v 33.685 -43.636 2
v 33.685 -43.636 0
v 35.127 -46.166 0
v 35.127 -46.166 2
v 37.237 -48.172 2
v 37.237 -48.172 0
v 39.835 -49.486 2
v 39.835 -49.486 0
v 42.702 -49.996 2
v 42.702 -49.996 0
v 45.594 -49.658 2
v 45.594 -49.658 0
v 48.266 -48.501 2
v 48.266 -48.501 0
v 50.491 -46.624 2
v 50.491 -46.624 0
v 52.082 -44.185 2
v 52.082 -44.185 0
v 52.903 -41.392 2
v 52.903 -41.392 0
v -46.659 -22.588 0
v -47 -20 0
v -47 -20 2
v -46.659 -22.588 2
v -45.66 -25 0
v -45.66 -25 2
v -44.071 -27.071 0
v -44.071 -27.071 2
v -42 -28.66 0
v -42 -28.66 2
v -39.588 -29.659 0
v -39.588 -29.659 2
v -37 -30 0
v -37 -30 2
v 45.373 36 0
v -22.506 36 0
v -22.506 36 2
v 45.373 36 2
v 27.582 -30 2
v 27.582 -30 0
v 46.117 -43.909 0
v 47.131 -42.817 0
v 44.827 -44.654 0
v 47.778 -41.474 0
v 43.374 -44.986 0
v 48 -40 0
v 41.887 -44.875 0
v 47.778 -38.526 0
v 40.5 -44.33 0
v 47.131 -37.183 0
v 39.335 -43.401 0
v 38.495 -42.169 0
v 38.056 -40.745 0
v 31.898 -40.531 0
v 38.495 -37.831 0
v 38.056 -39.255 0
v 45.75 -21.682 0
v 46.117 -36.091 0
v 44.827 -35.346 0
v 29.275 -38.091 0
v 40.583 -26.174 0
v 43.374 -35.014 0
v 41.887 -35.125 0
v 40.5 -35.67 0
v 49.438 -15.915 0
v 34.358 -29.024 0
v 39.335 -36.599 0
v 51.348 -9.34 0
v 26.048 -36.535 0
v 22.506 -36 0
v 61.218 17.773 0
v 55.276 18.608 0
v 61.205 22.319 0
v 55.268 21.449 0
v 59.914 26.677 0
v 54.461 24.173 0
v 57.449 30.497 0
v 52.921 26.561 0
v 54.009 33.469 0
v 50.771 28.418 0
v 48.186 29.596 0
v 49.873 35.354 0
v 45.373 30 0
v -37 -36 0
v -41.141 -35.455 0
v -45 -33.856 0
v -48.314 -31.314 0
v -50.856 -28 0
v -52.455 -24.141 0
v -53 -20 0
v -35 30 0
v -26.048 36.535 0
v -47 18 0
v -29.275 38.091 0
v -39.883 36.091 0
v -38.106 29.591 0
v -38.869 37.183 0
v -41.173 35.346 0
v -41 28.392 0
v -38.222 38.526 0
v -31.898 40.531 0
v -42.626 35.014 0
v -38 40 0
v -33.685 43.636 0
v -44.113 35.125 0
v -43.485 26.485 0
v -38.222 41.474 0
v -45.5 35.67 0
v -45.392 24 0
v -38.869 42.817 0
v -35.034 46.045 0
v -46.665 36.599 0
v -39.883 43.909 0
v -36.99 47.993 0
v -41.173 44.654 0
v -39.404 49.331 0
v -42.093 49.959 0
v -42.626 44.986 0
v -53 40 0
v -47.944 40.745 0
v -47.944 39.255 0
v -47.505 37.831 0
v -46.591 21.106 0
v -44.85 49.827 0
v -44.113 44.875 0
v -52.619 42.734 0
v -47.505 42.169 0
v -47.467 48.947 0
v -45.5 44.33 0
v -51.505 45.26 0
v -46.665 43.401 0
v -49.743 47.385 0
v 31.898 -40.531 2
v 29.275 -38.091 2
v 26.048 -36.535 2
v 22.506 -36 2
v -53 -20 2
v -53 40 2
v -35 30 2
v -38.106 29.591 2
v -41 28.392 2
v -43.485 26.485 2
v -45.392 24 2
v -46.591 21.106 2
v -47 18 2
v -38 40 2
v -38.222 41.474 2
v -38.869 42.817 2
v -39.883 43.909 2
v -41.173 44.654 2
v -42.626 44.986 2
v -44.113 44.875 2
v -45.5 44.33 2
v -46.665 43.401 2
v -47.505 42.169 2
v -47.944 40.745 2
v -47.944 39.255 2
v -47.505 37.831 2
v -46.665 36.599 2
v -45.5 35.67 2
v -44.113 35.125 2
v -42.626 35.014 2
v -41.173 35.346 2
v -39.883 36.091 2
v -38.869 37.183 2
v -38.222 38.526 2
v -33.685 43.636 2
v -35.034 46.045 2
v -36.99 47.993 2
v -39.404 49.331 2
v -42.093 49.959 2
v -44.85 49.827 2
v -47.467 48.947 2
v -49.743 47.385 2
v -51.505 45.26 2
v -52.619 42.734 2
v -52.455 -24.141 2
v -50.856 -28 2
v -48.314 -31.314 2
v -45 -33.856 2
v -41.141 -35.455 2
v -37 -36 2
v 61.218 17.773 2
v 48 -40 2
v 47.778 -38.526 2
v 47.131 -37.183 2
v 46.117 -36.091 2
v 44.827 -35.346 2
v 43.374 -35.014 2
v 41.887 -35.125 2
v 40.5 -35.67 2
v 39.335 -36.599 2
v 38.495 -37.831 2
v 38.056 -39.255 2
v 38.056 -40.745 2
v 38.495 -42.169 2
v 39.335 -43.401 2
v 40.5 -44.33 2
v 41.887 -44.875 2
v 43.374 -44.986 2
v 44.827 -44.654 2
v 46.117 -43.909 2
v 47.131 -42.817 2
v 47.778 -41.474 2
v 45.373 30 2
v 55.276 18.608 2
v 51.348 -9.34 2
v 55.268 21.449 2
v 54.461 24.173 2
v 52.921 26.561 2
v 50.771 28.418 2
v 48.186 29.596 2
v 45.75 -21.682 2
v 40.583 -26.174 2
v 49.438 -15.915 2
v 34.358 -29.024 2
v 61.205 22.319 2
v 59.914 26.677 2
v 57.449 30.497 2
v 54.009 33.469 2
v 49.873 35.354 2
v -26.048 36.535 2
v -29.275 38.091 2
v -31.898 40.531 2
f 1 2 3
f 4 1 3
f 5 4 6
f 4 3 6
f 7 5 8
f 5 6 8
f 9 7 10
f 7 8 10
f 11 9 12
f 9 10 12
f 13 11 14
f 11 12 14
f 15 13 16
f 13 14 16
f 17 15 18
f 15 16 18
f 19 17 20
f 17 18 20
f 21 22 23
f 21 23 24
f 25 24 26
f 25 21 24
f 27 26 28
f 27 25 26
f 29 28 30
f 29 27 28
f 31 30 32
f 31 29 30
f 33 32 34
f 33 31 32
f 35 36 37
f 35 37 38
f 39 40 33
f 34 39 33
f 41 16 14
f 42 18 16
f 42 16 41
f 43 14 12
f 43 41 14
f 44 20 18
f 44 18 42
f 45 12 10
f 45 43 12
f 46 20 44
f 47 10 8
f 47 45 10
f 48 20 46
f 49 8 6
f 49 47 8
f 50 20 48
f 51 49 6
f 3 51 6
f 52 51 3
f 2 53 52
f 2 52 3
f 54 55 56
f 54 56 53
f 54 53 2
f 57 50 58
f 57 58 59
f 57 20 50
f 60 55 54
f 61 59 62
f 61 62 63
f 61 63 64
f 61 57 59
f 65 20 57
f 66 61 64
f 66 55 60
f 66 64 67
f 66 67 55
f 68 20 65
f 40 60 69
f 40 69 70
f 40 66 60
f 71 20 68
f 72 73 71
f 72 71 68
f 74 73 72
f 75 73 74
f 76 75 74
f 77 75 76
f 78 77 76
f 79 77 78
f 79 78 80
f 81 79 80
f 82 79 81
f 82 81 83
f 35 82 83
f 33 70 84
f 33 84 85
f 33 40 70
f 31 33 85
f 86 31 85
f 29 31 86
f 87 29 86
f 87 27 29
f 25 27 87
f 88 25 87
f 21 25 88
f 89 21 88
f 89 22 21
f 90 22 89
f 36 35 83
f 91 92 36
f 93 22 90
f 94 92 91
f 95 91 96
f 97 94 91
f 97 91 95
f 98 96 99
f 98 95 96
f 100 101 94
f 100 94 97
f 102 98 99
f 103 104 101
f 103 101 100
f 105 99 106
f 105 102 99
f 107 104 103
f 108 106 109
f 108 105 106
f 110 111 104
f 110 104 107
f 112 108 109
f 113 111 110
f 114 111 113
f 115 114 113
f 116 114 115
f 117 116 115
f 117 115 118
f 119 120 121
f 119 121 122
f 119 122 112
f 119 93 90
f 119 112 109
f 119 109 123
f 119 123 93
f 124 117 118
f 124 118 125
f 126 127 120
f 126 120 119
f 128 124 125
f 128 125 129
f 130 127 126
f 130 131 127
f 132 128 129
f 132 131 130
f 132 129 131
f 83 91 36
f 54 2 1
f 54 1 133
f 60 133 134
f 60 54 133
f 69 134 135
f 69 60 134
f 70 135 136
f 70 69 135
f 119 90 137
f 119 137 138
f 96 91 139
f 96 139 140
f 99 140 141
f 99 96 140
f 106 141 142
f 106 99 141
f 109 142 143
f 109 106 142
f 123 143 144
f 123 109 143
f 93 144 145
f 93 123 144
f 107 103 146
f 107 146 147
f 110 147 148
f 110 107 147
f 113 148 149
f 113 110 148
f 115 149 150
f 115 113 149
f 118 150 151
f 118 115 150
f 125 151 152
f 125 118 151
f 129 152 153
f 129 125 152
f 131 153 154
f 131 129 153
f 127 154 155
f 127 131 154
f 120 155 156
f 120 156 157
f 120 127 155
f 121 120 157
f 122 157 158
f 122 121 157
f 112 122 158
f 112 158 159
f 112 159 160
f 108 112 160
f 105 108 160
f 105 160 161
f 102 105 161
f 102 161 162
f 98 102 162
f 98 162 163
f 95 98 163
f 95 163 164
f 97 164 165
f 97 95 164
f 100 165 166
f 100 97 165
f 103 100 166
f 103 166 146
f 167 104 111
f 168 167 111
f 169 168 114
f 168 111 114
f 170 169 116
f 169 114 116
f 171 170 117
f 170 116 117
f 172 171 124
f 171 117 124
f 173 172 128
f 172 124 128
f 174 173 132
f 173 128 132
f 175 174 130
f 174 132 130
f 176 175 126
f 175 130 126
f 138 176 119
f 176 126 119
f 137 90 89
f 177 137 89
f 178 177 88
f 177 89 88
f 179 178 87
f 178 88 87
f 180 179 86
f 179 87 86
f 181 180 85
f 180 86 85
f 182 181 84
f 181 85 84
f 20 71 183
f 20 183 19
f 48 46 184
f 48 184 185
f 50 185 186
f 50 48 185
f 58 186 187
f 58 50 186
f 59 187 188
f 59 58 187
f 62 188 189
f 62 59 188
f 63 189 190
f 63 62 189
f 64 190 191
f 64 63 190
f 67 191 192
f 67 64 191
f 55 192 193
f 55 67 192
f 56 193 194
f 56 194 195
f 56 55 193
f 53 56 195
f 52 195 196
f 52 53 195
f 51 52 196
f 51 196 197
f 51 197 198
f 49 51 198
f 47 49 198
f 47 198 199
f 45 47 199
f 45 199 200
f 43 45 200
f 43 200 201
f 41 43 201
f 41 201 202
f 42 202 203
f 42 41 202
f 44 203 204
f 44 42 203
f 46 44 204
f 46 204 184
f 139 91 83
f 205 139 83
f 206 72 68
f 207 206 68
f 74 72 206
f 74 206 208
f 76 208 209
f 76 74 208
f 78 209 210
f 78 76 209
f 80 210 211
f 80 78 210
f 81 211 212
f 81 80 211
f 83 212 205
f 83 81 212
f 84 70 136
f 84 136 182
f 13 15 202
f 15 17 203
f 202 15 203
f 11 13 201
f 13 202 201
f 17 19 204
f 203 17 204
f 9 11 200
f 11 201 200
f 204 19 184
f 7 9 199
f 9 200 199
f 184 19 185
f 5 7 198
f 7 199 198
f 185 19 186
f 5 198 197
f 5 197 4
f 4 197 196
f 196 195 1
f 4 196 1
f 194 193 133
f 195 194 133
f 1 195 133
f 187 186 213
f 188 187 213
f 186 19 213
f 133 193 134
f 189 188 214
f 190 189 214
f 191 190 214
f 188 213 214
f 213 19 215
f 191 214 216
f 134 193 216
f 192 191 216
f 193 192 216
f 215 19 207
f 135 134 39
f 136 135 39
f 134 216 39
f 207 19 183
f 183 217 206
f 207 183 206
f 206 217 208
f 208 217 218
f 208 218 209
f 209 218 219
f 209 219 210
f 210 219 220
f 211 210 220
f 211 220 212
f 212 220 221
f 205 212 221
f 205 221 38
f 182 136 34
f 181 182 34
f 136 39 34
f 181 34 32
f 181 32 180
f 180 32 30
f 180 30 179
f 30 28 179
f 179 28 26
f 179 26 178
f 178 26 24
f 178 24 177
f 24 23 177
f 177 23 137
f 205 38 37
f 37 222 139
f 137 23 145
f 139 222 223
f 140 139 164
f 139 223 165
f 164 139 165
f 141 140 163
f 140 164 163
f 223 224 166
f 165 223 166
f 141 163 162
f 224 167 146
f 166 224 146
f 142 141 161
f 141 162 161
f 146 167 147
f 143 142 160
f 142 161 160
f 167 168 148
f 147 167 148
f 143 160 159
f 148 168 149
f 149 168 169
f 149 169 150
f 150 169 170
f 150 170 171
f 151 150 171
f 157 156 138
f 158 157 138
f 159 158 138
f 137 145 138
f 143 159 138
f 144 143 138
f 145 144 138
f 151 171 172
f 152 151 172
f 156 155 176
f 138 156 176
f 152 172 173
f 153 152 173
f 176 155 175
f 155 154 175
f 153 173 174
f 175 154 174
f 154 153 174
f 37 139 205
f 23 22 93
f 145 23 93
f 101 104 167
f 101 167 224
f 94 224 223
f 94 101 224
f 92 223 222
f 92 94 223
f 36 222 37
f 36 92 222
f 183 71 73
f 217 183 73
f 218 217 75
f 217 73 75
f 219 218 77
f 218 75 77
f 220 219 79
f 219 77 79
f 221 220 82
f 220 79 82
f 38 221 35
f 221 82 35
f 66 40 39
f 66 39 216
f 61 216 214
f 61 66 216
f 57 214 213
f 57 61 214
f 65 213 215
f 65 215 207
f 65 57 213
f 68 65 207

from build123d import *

# Parameters (mm, degrees)
SKETCH_R  = 5
PAD_DEPTH = 2


with BuildPart() as part:
    # Sketch → Pad (new body)
    with BuildSketch(Plane.XY):
        with BuildLine():
            Line((-22.506098, 36), (45.373485, 36))
            ThreePointArc((61.217774, 17.77323), (57.448838, 30.496944), (45.373485, 36))
            Line((61.217774, 17.77323), (52.902681, -41.391731))
            ThreePointArc((33.68459, -43.636364), (44.160093, -49.932481), (52.902681, -41.391731))
            ThreePointArc((33.68459, -43.636364), (29.275011, -38.091326), (22.506098, -36))
            Line((22.506098, -36), (-37, -36))
            ThreePointArc((-53, -20), (-48.313708, -31.313708), (-37, -36))
            Line((-53, -20), (-53, 40))
            ThreePointArc((-33.68459, 43.636364), (-44.850122, 49.827362), (-53, 40))
            ThreePointArc((-33.68459, 43.636364), (-29.275011, 38.091326), (-22.506098, 36))
        make_face()
        with Locations((-43, 40)):
            Circle(SKETCH_R, mode=Mode.SUBTRACT)
        with Locations((43, -40)):
            Circle(SKETCH_R, mode=Mode.SUBTRACT)
        with BuildLine():
            Line((-35, 30), (45.373485, 30))
            ThreePointArc((55.276165, 18.608269), (52.92058, 26.56059), (45.373485, 30))
            Line((55.276165, 18.608269), (51.348271, -9.340154))
            ThreePointArc((27.581837, -30), (43.327254, -24.11303), (51.348271, -9.340154))
            Line((27.581837, -30), (-37, -30))
            ThreePointArc((-47, -20), (-44.071068, -27.071068), (-37, -30))
            Line((-47, -20), (-47, 18))
            ThreePointArc((-35, 30), (-43.485281, 26.485281), (-47, 18))
        make_face(mode=Mode.SUBTRACT)
    extrude(amount=PAD_DEPTH)


solid = part.part
